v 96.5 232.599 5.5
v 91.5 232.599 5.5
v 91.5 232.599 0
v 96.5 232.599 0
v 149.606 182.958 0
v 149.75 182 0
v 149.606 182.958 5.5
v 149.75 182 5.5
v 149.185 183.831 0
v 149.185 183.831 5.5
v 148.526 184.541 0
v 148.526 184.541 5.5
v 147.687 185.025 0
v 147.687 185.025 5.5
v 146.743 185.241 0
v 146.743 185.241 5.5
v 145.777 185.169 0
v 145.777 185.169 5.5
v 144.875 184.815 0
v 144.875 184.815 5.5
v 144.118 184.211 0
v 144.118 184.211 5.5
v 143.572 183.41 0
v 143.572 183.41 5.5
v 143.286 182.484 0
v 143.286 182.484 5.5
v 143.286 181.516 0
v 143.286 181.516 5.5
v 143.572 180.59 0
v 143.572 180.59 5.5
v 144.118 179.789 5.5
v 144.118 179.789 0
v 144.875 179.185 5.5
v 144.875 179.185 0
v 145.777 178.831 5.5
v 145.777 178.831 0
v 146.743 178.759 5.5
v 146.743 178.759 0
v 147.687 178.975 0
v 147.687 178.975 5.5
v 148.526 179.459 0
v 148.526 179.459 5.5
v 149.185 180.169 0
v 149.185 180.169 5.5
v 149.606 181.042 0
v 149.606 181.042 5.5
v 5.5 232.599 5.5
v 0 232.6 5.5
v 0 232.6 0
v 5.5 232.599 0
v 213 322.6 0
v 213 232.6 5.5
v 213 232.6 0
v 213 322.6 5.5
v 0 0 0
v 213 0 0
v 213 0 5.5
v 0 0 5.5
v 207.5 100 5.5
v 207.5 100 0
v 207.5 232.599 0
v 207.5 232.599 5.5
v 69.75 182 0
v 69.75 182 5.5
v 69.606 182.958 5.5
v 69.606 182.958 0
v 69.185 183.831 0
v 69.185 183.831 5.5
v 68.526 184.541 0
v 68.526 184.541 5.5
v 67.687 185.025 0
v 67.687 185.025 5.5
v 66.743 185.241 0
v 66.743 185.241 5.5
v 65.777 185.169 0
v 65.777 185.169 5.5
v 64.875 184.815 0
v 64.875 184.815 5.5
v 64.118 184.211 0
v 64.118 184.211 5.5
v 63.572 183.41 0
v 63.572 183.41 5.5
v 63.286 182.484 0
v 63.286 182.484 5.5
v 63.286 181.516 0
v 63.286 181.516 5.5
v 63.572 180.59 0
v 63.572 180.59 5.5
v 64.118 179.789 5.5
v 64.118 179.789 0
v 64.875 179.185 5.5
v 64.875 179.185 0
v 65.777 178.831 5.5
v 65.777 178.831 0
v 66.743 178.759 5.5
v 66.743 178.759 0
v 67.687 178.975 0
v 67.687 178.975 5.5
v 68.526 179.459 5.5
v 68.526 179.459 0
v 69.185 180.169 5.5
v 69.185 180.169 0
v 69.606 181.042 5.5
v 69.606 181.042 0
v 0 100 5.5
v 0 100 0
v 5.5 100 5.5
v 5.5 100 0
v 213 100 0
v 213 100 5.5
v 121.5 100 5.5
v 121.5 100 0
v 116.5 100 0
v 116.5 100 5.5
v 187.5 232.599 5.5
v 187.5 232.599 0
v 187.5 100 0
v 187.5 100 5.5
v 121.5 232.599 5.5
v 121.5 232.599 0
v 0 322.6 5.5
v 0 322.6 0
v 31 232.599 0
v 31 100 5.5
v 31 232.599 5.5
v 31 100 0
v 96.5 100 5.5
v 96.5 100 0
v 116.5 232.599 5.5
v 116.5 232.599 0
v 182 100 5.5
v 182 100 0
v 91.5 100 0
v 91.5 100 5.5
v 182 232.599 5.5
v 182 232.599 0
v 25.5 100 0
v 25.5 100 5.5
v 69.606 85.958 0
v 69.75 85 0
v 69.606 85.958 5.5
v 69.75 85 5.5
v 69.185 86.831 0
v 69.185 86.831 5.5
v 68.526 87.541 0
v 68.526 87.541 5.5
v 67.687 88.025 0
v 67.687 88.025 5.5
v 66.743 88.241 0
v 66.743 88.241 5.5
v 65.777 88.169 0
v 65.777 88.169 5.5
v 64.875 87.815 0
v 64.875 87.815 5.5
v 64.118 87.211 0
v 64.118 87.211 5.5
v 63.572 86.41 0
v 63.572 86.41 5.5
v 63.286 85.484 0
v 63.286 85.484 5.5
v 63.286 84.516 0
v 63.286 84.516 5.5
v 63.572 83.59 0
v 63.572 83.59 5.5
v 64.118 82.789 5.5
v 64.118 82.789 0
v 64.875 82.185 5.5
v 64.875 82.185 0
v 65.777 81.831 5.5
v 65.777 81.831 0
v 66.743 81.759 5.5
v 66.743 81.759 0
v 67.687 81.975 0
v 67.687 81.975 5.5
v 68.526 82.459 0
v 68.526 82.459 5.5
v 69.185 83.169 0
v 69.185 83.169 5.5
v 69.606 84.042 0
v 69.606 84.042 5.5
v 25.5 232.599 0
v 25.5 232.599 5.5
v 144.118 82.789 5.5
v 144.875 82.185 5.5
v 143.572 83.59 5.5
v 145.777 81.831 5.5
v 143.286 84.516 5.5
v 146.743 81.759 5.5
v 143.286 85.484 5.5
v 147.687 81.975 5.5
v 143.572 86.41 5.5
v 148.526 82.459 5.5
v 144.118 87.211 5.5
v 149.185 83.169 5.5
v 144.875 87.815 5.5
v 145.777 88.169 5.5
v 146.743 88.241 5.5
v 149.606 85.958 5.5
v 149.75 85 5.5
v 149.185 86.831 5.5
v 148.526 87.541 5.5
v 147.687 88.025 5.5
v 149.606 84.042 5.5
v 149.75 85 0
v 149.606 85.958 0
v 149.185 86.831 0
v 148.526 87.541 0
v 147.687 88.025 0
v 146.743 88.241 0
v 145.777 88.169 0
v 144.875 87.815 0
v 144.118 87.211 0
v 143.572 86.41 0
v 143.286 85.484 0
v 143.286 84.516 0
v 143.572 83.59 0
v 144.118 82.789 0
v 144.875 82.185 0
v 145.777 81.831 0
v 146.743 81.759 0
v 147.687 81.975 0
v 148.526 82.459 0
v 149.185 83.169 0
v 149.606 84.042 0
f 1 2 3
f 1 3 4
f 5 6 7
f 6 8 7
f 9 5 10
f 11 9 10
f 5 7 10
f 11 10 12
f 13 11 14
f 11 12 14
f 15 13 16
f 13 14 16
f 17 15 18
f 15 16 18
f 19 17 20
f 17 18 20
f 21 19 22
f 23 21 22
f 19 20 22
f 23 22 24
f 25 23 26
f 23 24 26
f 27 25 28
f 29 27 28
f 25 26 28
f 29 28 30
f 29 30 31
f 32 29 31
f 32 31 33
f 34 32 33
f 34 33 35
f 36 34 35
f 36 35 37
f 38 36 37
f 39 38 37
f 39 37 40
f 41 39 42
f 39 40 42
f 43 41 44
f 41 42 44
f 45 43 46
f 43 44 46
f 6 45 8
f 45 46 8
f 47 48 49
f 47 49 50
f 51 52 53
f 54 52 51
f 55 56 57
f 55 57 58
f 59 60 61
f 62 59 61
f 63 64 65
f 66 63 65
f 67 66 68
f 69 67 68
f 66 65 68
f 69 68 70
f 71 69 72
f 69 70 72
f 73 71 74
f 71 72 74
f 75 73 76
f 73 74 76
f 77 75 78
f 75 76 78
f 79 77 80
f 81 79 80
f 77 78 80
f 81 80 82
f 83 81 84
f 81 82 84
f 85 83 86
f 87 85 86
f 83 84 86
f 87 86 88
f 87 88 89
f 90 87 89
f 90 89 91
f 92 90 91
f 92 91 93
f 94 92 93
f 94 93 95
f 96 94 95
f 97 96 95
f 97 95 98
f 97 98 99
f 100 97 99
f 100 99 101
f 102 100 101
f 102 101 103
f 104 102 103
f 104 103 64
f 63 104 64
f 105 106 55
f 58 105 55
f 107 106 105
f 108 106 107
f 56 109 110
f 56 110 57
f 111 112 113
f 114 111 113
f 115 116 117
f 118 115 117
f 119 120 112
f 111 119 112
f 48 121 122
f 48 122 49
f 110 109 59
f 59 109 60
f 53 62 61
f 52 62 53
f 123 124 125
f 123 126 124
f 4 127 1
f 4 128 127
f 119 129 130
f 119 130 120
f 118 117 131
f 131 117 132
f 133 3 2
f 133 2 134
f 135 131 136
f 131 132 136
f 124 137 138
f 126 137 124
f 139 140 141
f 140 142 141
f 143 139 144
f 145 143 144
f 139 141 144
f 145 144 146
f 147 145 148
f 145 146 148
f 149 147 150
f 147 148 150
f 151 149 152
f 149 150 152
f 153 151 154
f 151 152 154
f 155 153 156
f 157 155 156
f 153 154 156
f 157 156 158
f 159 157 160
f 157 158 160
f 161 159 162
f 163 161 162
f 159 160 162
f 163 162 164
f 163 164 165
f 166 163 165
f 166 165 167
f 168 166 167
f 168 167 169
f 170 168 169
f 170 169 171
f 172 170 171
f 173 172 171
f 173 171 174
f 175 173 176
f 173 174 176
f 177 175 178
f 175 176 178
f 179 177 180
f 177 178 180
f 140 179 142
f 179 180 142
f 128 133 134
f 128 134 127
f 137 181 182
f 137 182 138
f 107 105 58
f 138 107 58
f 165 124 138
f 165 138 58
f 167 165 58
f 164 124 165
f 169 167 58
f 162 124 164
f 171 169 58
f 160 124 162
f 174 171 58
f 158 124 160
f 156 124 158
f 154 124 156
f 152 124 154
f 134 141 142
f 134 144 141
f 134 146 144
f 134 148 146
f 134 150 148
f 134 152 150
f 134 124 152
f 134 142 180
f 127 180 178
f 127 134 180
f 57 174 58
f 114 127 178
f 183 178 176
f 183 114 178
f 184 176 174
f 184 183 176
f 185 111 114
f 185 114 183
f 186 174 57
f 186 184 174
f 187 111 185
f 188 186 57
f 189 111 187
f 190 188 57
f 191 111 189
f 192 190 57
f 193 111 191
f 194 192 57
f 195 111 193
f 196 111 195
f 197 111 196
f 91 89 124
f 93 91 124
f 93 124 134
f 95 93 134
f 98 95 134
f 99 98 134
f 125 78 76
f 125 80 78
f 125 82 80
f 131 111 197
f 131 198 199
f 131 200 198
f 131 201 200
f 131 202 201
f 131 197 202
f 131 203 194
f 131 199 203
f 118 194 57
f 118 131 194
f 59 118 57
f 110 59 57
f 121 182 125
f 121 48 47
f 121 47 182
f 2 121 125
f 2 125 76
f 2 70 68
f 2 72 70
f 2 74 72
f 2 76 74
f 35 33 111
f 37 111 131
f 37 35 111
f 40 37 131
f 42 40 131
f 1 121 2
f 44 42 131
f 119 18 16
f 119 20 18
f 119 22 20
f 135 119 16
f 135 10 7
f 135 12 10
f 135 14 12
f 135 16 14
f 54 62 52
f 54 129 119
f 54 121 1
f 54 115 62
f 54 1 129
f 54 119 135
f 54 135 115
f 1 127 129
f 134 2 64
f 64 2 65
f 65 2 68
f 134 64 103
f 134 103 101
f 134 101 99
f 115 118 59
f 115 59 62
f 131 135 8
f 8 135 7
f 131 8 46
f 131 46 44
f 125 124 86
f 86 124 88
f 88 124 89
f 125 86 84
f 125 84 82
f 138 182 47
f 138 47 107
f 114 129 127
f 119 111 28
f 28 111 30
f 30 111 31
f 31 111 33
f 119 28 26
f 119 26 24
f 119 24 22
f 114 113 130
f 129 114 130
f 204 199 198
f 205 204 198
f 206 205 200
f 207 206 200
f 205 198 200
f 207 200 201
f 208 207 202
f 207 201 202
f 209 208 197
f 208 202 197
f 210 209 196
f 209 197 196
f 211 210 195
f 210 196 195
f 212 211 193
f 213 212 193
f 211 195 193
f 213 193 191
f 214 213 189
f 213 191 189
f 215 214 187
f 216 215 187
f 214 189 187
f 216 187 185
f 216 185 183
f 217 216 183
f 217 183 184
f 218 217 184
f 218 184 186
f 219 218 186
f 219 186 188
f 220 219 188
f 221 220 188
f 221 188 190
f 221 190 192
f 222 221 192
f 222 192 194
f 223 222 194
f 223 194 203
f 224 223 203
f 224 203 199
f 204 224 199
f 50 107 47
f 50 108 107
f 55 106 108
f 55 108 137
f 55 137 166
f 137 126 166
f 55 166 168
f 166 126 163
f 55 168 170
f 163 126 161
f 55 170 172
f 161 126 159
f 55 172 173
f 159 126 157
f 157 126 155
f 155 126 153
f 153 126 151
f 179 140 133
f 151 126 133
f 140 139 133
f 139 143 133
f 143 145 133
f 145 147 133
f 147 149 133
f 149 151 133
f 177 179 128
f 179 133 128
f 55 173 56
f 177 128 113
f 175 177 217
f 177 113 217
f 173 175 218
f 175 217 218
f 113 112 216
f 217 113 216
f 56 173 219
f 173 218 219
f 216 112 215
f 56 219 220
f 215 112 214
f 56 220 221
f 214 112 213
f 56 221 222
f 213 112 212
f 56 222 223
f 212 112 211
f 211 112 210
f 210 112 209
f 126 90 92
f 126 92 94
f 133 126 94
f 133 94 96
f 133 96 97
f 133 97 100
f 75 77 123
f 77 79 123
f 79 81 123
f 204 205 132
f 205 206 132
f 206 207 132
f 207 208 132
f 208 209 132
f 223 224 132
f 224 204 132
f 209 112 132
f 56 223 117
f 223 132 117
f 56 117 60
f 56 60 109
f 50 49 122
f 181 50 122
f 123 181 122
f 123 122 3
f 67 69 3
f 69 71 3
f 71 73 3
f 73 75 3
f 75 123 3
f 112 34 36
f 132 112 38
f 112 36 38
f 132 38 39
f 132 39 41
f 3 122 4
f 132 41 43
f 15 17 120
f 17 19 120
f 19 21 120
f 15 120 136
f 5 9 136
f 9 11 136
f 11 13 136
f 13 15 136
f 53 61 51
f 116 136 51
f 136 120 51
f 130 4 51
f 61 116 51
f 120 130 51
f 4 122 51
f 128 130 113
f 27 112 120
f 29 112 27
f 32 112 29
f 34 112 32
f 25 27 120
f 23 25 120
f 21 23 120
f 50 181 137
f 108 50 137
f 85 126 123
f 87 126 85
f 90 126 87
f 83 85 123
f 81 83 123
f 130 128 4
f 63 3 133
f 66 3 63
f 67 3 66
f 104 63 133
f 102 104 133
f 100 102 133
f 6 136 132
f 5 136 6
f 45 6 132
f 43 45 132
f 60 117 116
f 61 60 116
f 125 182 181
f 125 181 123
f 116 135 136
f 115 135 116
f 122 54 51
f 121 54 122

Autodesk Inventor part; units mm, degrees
ref_plane "YZ Plane" through (0, 0, 0) normal (1, 0, 0) x (0, 1, 0)
ref_plane "XZ Plane" through (0, 0, 0) normal (0, 1, 0) x (-1, 0, 0)
ref_plane "XY Plane" through (0, 0, 0) normal (0, 0, 1) x (1, 0, 0)
sketch "Sketch1" plane through (0, 0, 0) normal (0, 0, 1) x (1, 0, 0)
  line L0 (0, 0) -> (106.5, 0)
  line L1 (106.5, 0) -> (106.5, 232.6) construction
  line L2 (106.5, 232.6) -> (0, 232.6)
  line L3 (0, 232.6) -> (0, 0)
  line L4 (213, 0) -> (106.5, 0)
  line L5 (106.5, 232.6) -> (213, 232.6)
  line L6 (213, 232.6) -> (213, 0)
  line L7 (5.5, 100) -> (5.5, 232.599)
  line L8 (5.5, 232.599) -> (0, 232.599)
  line L9 (0, 232.599) -> (0, 100)
  line L10 (0, 100) -> (5.5, 100)
  line L11 (5.5, 100) -> (0, 232.599) construction
  line L12 (5.5, 232.599) -> (0, 100) construction
  line L13 (31, 100) -> (31, 232.599)
  line L14 (31, 232.599) -> (25.5, 232.599)
  line L15 (25.5, 232.599) -> (25.5, 100)
  line L16 (25.5, 100) -> (31, 100)
  line L17 (31, 100) -> (25.5, 232.599) construction
  line L18 (31, 232.599) -> (25.5, 100) construction
  line L19 (96.5, 100) -> (96.5, 232.599)
  line L20 (96.5, 232.599) -> (91.5, 232.599)
  line L21 (91.5, 232.599) -> (91.5, 100)
  line L22 (91.5, 100) -> (96.5, 100)
  line L23 (96.5, 100) -> (91.5, 232.599) construction
  line L24 (96.5, 232.599) -> (91.5, 100) construction
  line L25 (207.5, 100) -> (207.5, 232.599)
  line L26 (207.5, 232.599) -> (213, 232.599)
  line L27 (213, 232.599) -> (213, 100)
  line L28 (213, 100) -> (207.5, 100)
  line L29 (207.5, 100) -> (213, 232.599) construction
  line L30 (207.5, 232.599) -> (213, 100) construction
  line L31 (182, 100) -> (182, 232.599)
  line L32 (182, 232.599) -> (187.5, 232.599)
  line L33 (187.5, 232.599) -> (187.5, 100)
  line L34 (187.5, 100) -> (182, 100)
  line L35 (182, 100) -> (187.5, 232.599) construction
  line L36 (182, 232.599) -> (187.5, 100) construction
  line L37 (116.5, 100) -> (116.5, 232.599)
  line L38 (116.5, 232.599) -> (121.5, 232.599)
  line L39 (121.5, 232.599) -> (121.5, 100)
  line L40 (121.5, 100) -> (116.5, 100)
  line L41 (116.5, 100) -> (121.5, 232.599) construction
  line L42 (116.5, 232.599) -> (121.5, 100) construction
  line L43 (2.75, 166.2995) -> (94, 166.2995) construction
  point P0 (28.25, 166.2995)
  point P1 (210.25, 166.2995)
  point P2 (184.75, 166.2995)
  point P3 (119, 166.2995)
  point P4 (0, 100)
  point P5 (213, 100)
  point P6 (0, 232.599)
  dimension "d0" = 232.6
  dimension "d1" = 106.5
  dimension "d4" = 5.5
  dimension "d6" = 5.5
  dimension "d8" = 5
  dimension "d10" = 10
  dimension "d11" = 20
  dimension "d12" = 0
  dimension "d19" = 100
  dimension "d20" = 0.001
extrude "Extrusion1" add sketch "Sketch1" along normal blind 5.5 contours L3 L10 L7 L2 L15 L16 L13 L21 L22 L19 L5 L37 L40 L39 L31 L34 L33 L25 L28 L6 L4 L0
ref_plane "Work Plane3" through (61.25, 100, 0) normal (1, 0, 0) x (0, 0, -1)
sketch "Sketch2" plane through (0, 0, 5.5) normal (0, 0, 1) x (1, 0, 0)
  line L0 (0, 232.6) -> (213, 232.6)
  line L1 (213, 232.6) -> (213, 322.6)
  line L2 (213, 322.6) -> (0, 322.6)
  line L3 (0, 322.6) -> (0, 232.6)
  line L4 (213, 232.599) -> (213, 232.6) projected
  point P0 (0, 0)
  dimension "d15" = 90
extrude "Extrusion2" add sketch "Sketch2" against normal blind 5.5
sketch "Sketch3" plane through (0, 0, 5.5) normal (0, 0, 1) x (1, 0, 0)
  line L0 (213, 322.6) -> (0, 322.6) construction
  line L1 (31, 232.599) -> (31, 100) construction
  line L2 (91.5, 100) -> (91.5, 232.599) construction
  line L3 (121.5, 232.599) -> (121.5, 100) construction
  line L4 (31, 166.2995) -> (91.5, 166.2995) construction
  line L5 (91.5, 166.2995) -> (121.5, 166.2995) construction
  line L6 (106.5, 166.2995) -> (106.5, 322.6) construction
  circle A0 centre (66.5, 182) radius 3.25
  circle A1 centre (66.5, 85) radius 3.25
  circle A2 centre (146.5, 182) radius 3.25
  circle A3 centre (146.5, 85) radius 3.25
  line L7 (66.5, 85) -> (66.5, 182) construction
  line L8 (0, 0) -> (213, 0) projected
  dimension "d21" = 6.5
  dimension "d23" = 97
  dimension "d28" = 40
  dimension "d29" = 85
extrude "Extrusion3" cut sketch "Sketch3" against normal blind 10
ref_plane "Work Plane4" through (106.5, 100, 0) normal (1, 0, 0) x (0, 0, -1)
equation "\"d0\" = sidewallL + Uthick"
equation "\"d10\" = 0.5 * midbottomw"
equation "\"d11\" = lrbottomw"
equation "\"d19\" = Uthick"
equation "\"d15\" = wireL"
equation "\"d28\" = 0.5 * marshdistance"
equation "\"thick\" = 0.5"
equation "\"lrlr\" = 19"
equation "\"lrmid\" = 19.9"
equation "\"lrdepth\" = 3.3"
equation "\"mlr\" = 16.6"
equation "\"mmid\" = 24.7"
equation "\"mdepth\" = 4.5"
equation "\"lrltotal\" = 126.6"
equation "\"mltotal\" = 126.6"
equation "\"lrbetween\" = 52.1"
equation "\"mbetween\" = 49.5"
equation "\"toler\" = 1"
equation "\"lrbottomw\" = 20"
equation "\"tight\" = 0.08"
equation "\"stuckw\" = 6"
equation "\"sidewallL\" = 132.6"
equation "\"heaterH\" = 117.3"
equation "\"Uthick\" = 100"
equation "\"stickL\" = 3.5"
equation "\"wireH\" = 25"
equation "\"wireL\" = 90"
equation "\"midbottomw\" = 20"
equation "\"marshdistance\" = 80"
properties part number "deepest_layer"
